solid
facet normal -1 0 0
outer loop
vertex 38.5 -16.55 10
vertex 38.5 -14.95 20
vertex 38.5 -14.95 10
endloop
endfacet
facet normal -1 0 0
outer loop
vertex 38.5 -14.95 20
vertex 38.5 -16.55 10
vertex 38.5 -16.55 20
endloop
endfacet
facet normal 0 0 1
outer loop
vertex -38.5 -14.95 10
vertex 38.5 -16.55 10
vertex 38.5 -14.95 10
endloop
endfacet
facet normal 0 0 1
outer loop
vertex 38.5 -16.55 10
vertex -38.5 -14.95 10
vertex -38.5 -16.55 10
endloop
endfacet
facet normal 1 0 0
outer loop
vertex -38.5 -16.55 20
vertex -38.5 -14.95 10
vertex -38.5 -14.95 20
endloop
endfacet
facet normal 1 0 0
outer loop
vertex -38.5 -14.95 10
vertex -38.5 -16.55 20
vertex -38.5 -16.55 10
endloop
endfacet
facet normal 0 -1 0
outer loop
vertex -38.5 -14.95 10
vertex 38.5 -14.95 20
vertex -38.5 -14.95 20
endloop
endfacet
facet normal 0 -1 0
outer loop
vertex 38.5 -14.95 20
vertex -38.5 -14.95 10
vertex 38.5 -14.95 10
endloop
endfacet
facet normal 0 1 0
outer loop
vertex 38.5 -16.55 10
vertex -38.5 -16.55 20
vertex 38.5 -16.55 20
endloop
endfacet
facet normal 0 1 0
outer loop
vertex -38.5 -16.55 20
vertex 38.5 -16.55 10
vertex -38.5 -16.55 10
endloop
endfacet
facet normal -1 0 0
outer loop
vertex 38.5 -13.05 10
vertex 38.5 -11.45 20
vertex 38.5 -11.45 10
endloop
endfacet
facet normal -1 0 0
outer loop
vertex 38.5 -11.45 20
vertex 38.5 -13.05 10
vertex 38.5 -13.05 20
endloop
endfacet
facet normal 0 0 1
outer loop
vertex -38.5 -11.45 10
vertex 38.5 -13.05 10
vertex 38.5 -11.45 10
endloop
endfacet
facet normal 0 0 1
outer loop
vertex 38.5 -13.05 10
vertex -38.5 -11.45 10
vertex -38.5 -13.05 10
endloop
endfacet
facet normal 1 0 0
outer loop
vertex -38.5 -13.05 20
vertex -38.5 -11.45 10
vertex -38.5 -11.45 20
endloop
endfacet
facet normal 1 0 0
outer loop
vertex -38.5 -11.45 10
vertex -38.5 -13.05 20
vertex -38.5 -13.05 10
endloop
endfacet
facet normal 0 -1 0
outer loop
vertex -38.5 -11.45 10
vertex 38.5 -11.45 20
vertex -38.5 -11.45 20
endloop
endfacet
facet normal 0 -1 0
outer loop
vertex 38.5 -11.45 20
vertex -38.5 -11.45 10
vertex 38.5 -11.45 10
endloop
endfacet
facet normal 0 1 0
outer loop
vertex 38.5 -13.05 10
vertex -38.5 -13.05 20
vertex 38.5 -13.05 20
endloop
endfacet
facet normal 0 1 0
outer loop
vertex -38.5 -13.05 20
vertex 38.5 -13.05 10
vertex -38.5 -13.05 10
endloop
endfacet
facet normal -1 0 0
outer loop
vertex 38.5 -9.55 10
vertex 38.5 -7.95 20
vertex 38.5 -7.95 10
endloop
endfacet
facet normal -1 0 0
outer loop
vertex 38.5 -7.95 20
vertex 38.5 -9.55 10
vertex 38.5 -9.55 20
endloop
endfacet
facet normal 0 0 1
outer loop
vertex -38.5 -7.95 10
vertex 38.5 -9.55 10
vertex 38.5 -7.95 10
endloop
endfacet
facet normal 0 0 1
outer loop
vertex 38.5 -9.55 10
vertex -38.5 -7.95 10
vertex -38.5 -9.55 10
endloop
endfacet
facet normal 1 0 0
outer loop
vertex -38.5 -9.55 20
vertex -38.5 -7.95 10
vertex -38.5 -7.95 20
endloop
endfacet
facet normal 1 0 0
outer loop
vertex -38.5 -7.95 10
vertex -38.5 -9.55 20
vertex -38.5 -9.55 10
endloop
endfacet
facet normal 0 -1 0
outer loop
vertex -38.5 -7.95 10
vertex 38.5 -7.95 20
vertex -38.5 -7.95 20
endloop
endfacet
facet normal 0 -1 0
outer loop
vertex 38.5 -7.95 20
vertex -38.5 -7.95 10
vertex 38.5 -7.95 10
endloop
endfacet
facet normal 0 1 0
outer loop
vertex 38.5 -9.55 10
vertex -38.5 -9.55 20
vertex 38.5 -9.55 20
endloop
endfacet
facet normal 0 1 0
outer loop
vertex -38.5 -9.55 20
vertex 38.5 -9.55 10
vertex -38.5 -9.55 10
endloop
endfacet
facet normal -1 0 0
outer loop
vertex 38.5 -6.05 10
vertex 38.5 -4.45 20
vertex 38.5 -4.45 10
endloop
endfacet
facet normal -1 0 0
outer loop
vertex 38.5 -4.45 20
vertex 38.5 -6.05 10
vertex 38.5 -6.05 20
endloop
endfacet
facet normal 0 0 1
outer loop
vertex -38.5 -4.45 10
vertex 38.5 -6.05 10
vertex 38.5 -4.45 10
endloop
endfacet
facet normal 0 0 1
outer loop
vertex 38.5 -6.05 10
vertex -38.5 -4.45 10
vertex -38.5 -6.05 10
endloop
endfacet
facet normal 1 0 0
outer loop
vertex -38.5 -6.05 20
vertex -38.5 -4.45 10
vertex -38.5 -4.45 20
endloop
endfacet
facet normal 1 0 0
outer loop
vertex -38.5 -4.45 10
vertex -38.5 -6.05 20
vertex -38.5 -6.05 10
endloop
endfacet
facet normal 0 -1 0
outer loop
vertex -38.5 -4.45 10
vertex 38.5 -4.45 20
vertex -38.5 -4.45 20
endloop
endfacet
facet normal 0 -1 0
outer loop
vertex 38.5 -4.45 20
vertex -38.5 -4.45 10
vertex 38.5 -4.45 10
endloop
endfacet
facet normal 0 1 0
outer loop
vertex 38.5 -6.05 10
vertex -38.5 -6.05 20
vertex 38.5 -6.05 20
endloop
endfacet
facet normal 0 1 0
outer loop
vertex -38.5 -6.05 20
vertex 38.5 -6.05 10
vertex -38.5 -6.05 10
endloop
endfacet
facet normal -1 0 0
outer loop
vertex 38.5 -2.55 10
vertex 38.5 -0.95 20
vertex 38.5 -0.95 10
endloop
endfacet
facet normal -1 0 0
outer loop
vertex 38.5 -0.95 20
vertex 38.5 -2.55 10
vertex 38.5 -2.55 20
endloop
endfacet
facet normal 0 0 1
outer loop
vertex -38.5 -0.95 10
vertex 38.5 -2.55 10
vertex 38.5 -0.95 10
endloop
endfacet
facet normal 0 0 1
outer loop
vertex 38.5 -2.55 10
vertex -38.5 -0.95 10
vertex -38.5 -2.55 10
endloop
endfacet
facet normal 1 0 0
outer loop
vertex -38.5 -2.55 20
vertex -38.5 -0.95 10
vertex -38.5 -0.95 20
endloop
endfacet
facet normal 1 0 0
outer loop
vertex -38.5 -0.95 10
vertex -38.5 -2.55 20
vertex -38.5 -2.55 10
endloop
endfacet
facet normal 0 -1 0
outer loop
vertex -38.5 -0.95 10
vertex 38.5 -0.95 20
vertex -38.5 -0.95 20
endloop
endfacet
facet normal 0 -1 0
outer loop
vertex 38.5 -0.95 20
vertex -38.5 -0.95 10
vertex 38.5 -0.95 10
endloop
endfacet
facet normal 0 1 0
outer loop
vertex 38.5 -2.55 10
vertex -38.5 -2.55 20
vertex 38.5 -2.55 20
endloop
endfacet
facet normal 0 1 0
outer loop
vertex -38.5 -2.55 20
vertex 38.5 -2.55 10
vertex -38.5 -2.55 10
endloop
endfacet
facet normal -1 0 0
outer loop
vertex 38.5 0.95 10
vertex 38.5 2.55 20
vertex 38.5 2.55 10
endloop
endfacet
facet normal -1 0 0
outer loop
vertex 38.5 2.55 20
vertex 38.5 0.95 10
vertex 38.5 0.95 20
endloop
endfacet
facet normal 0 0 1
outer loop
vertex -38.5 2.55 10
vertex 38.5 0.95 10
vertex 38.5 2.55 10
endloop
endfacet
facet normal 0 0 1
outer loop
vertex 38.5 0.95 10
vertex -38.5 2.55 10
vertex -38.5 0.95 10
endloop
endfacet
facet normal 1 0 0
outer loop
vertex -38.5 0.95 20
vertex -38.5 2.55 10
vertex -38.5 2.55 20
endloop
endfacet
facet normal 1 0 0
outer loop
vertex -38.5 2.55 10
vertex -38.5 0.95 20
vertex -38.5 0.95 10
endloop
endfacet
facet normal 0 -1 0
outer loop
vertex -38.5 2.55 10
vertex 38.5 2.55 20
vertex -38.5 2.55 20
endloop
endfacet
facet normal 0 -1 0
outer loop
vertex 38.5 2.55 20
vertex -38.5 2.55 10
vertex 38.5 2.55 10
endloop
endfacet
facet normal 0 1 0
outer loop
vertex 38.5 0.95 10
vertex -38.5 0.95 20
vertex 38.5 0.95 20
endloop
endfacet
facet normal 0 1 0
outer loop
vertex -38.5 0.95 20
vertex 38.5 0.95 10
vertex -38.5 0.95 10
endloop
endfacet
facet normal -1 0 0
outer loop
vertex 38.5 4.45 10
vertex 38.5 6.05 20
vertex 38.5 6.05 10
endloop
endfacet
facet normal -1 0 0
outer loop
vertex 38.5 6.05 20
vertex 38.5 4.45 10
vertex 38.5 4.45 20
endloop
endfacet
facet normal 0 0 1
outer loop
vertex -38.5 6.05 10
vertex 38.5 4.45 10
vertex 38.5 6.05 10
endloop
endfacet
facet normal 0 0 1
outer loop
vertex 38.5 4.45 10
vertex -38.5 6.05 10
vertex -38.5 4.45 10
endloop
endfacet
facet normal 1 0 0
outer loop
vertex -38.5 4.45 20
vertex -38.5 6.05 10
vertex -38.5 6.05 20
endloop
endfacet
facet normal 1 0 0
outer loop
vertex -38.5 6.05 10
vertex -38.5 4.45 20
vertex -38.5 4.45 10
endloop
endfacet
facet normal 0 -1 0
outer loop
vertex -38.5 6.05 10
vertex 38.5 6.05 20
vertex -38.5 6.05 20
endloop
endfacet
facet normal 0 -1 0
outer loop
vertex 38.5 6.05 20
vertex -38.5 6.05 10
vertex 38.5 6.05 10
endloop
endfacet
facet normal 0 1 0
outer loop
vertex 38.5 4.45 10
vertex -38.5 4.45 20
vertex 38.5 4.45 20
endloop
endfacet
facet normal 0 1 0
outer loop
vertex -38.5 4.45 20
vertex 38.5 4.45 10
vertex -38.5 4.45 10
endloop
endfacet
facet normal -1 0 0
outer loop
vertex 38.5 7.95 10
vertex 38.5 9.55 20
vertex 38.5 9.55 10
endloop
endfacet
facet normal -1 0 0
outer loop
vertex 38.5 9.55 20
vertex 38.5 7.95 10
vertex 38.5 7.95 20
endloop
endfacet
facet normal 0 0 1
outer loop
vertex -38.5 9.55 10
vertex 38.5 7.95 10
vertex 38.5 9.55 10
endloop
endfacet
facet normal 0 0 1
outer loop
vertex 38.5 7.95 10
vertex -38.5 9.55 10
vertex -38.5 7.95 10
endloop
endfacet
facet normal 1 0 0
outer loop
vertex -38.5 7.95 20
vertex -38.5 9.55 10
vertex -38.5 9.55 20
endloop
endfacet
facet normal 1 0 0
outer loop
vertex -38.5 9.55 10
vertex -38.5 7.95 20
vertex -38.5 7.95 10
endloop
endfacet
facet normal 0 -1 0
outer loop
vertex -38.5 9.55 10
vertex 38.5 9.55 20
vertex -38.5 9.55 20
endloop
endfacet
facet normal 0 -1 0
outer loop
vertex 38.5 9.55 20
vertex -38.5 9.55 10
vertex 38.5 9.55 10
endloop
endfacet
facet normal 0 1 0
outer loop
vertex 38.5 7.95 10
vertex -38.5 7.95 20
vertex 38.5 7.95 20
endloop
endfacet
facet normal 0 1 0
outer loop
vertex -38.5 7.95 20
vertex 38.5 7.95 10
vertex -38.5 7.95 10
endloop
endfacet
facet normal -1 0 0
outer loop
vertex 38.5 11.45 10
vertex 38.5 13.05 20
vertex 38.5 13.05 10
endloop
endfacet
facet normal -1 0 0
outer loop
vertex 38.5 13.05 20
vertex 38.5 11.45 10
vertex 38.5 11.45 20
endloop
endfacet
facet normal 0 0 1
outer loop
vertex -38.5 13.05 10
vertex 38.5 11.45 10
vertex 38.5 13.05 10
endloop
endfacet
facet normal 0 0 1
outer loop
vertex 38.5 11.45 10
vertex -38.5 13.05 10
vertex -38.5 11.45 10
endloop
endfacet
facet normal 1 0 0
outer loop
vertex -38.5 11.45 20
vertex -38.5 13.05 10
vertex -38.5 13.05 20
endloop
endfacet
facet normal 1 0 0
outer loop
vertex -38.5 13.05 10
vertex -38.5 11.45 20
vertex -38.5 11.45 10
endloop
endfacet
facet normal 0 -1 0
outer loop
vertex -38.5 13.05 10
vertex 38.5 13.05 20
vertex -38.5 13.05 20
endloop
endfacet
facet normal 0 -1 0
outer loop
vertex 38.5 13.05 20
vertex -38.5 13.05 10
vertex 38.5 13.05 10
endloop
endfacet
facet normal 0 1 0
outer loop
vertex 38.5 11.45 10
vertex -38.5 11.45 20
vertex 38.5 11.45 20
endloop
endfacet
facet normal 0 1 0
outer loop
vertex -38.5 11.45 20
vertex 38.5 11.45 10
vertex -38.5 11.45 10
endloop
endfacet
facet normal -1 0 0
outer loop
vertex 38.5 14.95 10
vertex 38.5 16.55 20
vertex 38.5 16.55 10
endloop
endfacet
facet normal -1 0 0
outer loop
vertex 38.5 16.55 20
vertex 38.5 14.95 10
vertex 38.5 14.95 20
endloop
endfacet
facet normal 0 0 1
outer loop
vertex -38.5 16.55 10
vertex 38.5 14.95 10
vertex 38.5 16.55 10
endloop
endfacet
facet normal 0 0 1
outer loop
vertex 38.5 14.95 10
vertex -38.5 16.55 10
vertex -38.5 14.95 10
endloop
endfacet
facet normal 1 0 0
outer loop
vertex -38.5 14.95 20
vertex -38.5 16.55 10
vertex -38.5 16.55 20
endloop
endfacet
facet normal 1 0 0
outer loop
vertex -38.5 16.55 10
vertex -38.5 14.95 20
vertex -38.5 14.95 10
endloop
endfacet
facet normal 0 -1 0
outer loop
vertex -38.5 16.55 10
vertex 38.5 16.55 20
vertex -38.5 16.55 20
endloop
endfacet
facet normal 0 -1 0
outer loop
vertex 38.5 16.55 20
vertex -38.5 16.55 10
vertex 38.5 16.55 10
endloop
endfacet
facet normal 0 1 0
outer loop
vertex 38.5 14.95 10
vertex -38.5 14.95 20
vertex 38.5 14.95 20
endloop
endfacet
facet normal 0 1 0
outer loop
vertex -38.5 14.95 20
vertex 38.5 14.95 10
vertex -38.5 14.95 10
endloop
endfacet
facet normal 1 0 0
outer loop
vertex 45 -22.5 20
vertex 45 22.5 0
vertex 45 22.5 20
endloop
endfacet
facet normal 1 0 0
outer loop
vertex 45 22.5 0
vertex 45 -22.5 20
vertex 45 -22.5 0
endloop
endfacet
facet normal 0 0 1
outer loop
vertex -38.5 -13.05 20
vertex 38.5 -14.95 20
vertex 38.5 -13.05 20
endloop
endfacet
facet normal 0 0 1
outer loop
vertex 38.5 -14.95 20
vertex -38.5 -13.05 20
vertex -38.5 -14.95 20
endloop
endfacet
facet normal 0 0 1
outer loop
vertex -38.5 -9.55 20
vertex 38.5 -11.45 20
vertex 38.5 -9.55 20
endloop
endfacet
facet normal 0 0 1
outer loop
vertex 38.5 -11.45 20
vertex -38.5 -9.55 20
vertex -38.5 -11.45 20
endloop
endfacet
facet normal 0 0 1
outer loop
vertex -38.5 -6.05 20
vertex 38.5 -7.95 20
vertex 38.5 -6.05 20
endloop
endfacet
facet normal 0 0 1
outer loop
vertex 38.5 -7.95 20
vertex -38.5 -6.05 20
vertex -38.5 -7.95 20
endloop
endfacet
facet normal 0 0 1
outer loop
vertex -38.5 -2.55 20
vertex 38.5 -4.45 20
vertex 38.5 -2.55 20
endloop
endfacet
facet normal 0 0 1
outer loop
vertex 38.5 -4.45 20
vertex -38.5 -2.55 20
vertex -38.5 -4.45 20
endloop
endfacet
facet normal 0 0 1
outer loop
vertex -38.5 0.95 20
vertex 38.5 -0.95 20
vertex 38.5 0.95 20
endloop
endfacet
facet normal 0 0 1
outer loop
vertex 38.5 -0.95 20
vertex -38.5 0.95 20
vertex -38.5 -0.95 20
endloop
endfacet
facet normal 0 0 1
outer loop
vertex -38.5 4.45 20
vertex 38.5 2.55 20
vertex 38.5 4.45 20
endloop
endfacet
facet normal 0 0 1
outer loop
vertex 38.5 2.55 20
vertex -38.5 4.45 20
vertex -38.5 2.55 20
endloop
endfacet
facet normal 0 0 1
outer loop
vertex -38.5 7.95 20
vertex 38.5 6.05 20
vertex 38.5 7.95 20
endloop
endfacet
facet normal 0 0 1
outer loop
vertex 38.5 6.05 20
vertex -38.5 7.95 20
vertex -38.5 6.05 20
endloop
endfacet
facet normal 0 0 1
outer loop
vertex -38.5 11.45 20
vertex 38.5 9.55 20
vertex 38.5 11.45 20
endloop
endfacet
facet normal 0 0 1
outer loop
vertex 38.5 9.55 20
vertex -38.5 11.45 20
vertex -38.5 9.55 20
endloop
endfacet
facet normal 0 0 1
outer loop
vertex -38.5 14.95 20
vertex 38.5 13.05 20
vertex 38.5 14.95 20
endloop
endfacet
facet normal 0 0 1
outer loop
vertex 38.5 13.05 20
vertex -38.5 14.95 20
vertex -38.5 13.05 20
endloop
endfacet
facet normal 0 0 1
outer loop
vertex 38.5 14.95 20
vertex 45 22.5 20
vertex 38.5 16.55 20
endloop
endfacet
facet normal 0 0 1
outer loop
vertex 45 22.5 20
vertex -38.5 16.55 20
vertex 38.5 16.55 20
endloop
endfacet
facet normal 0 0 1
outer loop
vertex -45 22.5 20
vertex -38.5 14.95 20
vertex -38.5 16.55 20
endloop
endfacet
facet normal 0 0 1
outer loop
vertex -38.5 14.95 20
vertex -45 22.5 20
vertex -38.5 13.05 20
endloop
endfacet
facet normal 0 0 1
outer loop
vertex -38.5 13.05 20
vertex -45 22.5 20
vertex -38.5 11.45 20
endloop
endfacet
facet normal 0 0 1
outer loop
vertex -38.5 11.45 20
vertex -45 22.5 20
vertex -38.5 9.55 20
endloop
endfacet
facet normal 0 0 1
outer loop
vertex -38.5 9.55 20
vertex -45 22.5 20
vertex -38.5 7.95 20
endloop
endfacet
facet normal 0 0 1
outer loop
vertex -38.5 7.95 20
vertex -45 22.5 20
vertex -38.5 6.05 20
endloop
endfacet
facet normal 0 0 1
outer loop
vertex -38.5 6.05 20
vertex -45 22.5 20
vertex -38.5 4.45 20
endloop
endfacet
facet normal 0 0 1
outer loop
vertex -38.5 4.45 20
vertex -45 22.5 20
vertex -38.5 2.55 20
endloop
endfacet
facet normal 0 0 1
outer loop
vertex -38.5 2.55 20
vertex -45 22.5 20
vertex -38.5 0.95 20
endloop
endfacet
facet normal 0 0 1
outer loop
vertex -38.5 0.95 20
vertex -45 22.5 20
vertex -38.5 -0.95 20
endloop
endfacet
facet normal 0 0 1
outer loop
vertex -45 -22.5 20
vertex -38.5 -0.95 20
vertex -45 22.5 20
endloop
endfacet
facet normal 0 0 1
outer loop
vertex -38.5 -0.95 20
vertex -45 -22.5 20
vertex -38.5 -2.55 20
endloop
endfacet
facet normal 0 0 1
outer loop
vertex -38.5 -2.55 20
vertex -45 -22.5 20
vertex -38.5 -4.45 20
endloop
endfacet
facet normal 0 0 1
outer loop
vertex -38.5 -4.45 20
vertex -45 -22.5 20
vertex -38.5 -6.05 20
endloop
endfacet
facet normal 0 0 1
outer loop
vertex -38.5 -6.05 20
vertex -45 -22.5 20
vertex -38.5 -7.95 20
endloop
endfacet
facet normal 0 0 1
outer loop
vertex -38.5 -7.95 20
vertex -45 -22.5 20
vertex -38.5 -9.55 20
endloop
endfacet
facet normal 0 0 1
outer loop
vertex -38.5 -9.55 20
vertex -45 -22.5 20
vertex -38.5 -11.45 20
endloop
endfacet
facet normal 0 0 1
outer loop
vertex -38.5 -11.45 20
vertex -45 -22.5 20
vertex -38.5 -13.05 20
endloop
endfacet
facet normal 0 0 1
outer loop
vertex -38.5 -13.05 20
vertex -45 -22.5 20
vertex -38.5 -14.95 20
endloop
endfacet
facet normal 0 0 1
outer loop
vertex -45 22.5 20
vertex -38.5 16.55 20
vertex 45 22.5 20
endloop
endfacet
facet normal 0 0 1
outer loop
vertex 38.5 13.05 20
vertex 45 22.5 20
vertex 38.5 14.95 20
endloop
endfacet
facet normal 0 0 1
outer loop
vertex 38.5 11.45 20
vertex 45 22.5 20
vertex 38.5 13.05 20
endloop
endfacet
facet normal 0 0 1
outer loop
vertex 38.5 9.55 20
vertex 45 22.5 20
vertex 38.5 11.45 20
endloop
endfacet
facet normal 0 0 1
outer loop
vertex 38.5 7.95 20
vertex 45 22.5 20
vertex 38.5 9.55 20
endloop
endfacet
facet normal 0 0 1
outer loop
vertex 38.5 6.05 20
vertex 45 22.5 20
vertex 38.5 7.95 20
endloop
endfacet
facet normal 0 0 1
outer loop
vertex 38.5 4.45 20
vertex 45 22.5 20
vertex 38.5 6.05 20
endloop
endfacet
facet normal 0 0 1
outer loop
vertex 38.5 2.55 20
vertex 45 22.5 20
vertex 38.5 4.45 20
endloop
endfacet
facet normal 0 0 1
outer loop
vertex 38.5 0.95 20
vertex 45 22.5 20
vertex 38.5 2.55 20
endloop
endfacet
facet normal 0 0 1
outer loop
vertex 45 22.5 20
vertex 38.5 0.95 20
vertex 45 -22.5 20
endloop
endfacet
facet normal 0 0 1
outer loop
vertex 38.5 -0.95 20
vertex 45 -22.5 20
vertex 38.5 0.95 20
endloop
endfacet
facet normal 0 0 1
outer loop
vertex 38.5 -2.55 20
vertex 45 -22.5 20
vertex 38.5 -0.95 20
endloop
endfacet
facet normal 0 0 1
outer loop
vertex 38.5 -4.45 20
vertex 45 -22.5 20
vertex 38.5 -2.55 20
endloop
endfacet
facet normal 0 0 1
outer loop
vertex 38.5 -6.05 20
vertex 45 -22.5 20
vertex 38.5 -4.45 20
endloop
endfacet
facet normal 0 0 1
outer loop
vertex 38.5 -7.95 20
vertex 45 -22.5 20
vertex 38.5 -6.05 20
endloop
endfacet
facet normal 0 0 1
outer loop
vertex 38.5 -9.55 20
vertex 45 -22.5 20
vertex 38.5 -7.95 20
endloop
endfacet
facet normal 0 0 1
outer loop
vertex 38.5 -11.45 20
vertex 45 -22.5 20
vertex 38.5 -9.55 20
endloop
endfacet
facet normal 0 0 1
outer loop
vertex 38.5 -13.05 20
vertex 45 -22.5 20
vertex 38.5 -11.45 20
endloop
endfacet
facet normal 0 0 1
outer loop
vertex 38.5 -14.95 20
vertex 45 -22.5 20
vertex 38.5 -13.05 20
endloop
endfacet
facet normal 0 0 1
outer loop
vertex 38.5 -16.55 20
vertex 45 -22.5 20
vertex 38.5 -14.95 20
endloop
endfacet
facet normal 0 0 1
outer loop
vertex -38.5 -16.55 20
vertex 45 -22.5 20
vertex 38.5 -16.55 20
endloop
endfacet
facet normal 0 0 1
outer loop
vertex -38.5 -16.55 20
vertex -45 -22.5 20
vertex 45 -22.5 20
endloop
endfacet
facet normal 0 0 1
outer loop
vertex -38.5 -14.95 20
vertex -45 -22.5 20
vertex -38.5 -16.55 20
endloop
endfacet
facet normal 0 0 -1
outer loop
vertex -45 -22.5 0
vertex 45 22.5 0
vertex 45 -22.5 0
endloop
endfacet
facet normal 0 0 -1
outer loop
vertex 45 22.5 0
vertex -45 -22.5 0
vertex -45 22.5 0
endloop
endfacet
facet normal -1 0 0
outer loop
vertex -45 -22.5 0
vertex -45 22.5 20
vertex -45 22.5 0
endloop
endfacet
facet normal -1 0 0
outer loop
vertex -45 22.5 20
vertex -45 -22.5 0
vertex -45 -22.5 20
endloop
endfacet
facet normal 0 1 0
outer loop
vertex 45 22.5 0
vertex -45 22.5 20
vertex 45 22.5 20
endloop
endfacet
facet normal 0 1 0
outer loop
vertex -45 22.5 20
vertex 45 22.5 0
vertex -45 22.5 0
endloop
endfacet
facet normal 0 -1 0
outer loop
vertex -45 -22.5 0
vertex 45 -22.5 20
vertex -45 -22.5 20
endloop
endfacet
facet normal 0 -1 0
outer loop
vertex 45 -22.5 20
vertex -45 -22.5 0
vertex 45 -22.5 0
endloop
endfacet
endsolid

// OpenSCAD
// Dimensions (mm)
base_length = 90;      // X dimension of the base block
base_width  = 45;      // Y dimension of the base block
base_height = 20;      // Z dimension of the base block (bottom at Z=0)

slot_length = 77;      // Length of each slot along X
slot_width  = 1.6;    // Width of each slot along Y
slot_depth  = 10;      // Depth of each slot into the block (from top surface)
slot_extra = 0.2;      // Extra material removed beyond the top face (to avoid coplanar faces)

slot_spacing = 3.5;    // Centre‑to‑centre spacing of slots in Y
slot_count   = 10;    // Number of slots

$fn = 64; // resolution for any curved shapes (not used here)

// Base block, rests on XY plane at Z=0 and centred in X/Y
module base_block() {
    translate([-base_length/2, -base_width/2, 0])
        cube([base_length, base_width, base_height]);
}

// Cutter for a single slot (open at the top)
module slot_cutter(ypos) {
    // Position the cutter so its bottom starts at (base_height - slot_depth)
    // and its top extends slot_extra beyond the top surface.
    translate([
        -slot_length/2,
        ypos - slot_width/2,
        base_height - slot_depth
    ])
        cube([slot_length, slot_width, slot_depth + slot_extra]); // default center = false
}

// Assemble all slot cutters
module all_slots() {
    union() {
        for (i = [0:slot_count-1])
            slot_cutter((i - (slot_count - 1)/2) * slot_spacing);
    }
}

// Final part: base block with slots cut out
difference() {
    base_block();
    all_slots();
}
